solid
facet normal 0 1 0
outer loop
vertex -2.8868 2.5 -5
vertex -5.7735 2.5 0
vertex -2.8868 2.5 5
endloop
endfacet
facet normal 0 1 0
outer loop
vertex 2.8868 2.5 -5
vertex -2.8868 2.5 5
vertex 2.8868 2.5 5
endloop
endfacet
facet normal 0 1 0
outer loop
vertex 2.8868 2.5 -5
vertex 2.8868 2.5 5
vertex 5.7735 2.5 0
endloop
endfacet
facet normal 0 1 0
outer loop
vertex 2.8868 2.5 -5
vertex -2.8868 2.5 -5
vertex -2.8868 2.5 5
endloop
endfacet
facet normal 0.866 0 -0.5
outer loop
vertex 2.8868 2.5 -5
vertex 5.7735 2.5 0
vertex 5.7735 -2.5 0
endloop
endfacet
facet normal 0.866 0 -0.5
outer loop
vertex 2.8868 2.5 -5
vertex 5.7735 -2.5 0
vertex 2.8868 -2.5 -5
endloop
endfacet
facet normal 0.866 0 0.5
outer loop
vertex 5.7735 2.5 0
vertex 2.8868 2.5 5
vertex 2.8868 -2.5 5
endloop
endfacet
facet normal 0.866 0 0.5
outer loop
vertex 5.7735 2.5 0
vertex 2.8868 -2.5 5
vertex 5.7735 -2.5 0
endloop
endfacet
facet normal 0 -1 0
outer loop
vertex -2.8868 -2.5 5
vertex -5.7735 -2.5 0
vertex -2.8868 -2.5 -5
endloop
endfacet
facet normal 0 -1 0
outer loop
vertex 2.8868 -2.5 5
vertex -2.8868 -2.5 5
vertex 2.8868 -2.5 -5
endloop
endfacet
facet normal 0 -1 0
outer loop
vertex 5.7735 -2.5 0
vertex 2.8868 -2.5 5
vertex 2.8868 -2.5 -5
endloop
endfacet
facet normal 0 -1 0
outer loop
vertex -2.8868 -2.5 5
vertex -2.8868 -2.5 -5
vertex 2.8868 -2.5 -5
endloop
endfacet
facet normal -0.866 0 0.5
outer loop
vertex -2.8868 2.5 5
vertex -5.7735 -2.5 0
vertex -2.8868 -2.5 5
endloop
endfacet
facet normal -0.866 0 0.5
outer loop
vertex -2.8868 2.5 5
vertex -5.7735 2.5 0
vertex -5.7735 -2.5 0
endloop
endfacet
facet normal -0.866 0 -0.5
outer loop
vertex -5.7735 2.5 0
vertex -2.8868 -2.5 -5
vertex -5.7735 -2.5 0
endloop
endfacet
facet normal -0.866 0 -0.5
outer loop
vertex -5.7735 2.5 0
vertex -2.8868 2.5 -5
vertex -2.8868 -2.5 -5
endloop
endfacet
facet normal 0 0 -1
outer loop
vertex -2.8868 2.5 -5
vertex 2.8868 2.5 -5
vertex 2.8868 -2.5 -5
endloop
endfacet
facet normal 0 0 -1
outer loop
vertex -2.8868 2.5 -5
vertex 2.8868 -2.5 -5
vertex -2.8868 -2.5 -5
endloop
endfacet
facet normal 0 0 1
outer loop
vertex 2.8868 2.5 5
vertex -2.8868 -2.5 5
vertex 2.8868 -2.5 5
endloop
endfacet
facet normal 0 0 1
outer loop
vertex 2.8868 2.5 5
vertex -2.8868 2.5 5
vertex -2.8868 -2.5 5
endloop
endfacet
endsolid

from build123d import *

# Parameters (mm, degrees)
SKETCH2_R           = 3
BOSS_EXTRUDE2_DEPTH = 2.5


with BuildPart() as part:
    # Sketch2 → Boss-Extrude2 (new, symmetric)
    # profile 1 of 2: a face of its own
    with BuildSketch(Plane(origin=(0, 0, 0), x_dir=(1, 0, 0), z_dir=(0, 1, 0))):
        Polygon((-2.886751346, -5), (2.886751346, -5), (5.773502692, 0), (2.886751346, 5), (-2.886751346, 5), (-5.773502692, 0), align=None)
        Circle(SKETCH2_R, mode=Mode.SUBTRACT)
    # profile 2 of 2: a face of its own
    with BuildSketch(Plane(origin=(0, 0, 0), x_dir=(1, 0, 0), z_dir=(0, 1, 0))):
        Circle(SKETCH2_R)
    extrude(amount=BOSS_EXTRUDE2_DEPTH, both=True)


solid = part.part
